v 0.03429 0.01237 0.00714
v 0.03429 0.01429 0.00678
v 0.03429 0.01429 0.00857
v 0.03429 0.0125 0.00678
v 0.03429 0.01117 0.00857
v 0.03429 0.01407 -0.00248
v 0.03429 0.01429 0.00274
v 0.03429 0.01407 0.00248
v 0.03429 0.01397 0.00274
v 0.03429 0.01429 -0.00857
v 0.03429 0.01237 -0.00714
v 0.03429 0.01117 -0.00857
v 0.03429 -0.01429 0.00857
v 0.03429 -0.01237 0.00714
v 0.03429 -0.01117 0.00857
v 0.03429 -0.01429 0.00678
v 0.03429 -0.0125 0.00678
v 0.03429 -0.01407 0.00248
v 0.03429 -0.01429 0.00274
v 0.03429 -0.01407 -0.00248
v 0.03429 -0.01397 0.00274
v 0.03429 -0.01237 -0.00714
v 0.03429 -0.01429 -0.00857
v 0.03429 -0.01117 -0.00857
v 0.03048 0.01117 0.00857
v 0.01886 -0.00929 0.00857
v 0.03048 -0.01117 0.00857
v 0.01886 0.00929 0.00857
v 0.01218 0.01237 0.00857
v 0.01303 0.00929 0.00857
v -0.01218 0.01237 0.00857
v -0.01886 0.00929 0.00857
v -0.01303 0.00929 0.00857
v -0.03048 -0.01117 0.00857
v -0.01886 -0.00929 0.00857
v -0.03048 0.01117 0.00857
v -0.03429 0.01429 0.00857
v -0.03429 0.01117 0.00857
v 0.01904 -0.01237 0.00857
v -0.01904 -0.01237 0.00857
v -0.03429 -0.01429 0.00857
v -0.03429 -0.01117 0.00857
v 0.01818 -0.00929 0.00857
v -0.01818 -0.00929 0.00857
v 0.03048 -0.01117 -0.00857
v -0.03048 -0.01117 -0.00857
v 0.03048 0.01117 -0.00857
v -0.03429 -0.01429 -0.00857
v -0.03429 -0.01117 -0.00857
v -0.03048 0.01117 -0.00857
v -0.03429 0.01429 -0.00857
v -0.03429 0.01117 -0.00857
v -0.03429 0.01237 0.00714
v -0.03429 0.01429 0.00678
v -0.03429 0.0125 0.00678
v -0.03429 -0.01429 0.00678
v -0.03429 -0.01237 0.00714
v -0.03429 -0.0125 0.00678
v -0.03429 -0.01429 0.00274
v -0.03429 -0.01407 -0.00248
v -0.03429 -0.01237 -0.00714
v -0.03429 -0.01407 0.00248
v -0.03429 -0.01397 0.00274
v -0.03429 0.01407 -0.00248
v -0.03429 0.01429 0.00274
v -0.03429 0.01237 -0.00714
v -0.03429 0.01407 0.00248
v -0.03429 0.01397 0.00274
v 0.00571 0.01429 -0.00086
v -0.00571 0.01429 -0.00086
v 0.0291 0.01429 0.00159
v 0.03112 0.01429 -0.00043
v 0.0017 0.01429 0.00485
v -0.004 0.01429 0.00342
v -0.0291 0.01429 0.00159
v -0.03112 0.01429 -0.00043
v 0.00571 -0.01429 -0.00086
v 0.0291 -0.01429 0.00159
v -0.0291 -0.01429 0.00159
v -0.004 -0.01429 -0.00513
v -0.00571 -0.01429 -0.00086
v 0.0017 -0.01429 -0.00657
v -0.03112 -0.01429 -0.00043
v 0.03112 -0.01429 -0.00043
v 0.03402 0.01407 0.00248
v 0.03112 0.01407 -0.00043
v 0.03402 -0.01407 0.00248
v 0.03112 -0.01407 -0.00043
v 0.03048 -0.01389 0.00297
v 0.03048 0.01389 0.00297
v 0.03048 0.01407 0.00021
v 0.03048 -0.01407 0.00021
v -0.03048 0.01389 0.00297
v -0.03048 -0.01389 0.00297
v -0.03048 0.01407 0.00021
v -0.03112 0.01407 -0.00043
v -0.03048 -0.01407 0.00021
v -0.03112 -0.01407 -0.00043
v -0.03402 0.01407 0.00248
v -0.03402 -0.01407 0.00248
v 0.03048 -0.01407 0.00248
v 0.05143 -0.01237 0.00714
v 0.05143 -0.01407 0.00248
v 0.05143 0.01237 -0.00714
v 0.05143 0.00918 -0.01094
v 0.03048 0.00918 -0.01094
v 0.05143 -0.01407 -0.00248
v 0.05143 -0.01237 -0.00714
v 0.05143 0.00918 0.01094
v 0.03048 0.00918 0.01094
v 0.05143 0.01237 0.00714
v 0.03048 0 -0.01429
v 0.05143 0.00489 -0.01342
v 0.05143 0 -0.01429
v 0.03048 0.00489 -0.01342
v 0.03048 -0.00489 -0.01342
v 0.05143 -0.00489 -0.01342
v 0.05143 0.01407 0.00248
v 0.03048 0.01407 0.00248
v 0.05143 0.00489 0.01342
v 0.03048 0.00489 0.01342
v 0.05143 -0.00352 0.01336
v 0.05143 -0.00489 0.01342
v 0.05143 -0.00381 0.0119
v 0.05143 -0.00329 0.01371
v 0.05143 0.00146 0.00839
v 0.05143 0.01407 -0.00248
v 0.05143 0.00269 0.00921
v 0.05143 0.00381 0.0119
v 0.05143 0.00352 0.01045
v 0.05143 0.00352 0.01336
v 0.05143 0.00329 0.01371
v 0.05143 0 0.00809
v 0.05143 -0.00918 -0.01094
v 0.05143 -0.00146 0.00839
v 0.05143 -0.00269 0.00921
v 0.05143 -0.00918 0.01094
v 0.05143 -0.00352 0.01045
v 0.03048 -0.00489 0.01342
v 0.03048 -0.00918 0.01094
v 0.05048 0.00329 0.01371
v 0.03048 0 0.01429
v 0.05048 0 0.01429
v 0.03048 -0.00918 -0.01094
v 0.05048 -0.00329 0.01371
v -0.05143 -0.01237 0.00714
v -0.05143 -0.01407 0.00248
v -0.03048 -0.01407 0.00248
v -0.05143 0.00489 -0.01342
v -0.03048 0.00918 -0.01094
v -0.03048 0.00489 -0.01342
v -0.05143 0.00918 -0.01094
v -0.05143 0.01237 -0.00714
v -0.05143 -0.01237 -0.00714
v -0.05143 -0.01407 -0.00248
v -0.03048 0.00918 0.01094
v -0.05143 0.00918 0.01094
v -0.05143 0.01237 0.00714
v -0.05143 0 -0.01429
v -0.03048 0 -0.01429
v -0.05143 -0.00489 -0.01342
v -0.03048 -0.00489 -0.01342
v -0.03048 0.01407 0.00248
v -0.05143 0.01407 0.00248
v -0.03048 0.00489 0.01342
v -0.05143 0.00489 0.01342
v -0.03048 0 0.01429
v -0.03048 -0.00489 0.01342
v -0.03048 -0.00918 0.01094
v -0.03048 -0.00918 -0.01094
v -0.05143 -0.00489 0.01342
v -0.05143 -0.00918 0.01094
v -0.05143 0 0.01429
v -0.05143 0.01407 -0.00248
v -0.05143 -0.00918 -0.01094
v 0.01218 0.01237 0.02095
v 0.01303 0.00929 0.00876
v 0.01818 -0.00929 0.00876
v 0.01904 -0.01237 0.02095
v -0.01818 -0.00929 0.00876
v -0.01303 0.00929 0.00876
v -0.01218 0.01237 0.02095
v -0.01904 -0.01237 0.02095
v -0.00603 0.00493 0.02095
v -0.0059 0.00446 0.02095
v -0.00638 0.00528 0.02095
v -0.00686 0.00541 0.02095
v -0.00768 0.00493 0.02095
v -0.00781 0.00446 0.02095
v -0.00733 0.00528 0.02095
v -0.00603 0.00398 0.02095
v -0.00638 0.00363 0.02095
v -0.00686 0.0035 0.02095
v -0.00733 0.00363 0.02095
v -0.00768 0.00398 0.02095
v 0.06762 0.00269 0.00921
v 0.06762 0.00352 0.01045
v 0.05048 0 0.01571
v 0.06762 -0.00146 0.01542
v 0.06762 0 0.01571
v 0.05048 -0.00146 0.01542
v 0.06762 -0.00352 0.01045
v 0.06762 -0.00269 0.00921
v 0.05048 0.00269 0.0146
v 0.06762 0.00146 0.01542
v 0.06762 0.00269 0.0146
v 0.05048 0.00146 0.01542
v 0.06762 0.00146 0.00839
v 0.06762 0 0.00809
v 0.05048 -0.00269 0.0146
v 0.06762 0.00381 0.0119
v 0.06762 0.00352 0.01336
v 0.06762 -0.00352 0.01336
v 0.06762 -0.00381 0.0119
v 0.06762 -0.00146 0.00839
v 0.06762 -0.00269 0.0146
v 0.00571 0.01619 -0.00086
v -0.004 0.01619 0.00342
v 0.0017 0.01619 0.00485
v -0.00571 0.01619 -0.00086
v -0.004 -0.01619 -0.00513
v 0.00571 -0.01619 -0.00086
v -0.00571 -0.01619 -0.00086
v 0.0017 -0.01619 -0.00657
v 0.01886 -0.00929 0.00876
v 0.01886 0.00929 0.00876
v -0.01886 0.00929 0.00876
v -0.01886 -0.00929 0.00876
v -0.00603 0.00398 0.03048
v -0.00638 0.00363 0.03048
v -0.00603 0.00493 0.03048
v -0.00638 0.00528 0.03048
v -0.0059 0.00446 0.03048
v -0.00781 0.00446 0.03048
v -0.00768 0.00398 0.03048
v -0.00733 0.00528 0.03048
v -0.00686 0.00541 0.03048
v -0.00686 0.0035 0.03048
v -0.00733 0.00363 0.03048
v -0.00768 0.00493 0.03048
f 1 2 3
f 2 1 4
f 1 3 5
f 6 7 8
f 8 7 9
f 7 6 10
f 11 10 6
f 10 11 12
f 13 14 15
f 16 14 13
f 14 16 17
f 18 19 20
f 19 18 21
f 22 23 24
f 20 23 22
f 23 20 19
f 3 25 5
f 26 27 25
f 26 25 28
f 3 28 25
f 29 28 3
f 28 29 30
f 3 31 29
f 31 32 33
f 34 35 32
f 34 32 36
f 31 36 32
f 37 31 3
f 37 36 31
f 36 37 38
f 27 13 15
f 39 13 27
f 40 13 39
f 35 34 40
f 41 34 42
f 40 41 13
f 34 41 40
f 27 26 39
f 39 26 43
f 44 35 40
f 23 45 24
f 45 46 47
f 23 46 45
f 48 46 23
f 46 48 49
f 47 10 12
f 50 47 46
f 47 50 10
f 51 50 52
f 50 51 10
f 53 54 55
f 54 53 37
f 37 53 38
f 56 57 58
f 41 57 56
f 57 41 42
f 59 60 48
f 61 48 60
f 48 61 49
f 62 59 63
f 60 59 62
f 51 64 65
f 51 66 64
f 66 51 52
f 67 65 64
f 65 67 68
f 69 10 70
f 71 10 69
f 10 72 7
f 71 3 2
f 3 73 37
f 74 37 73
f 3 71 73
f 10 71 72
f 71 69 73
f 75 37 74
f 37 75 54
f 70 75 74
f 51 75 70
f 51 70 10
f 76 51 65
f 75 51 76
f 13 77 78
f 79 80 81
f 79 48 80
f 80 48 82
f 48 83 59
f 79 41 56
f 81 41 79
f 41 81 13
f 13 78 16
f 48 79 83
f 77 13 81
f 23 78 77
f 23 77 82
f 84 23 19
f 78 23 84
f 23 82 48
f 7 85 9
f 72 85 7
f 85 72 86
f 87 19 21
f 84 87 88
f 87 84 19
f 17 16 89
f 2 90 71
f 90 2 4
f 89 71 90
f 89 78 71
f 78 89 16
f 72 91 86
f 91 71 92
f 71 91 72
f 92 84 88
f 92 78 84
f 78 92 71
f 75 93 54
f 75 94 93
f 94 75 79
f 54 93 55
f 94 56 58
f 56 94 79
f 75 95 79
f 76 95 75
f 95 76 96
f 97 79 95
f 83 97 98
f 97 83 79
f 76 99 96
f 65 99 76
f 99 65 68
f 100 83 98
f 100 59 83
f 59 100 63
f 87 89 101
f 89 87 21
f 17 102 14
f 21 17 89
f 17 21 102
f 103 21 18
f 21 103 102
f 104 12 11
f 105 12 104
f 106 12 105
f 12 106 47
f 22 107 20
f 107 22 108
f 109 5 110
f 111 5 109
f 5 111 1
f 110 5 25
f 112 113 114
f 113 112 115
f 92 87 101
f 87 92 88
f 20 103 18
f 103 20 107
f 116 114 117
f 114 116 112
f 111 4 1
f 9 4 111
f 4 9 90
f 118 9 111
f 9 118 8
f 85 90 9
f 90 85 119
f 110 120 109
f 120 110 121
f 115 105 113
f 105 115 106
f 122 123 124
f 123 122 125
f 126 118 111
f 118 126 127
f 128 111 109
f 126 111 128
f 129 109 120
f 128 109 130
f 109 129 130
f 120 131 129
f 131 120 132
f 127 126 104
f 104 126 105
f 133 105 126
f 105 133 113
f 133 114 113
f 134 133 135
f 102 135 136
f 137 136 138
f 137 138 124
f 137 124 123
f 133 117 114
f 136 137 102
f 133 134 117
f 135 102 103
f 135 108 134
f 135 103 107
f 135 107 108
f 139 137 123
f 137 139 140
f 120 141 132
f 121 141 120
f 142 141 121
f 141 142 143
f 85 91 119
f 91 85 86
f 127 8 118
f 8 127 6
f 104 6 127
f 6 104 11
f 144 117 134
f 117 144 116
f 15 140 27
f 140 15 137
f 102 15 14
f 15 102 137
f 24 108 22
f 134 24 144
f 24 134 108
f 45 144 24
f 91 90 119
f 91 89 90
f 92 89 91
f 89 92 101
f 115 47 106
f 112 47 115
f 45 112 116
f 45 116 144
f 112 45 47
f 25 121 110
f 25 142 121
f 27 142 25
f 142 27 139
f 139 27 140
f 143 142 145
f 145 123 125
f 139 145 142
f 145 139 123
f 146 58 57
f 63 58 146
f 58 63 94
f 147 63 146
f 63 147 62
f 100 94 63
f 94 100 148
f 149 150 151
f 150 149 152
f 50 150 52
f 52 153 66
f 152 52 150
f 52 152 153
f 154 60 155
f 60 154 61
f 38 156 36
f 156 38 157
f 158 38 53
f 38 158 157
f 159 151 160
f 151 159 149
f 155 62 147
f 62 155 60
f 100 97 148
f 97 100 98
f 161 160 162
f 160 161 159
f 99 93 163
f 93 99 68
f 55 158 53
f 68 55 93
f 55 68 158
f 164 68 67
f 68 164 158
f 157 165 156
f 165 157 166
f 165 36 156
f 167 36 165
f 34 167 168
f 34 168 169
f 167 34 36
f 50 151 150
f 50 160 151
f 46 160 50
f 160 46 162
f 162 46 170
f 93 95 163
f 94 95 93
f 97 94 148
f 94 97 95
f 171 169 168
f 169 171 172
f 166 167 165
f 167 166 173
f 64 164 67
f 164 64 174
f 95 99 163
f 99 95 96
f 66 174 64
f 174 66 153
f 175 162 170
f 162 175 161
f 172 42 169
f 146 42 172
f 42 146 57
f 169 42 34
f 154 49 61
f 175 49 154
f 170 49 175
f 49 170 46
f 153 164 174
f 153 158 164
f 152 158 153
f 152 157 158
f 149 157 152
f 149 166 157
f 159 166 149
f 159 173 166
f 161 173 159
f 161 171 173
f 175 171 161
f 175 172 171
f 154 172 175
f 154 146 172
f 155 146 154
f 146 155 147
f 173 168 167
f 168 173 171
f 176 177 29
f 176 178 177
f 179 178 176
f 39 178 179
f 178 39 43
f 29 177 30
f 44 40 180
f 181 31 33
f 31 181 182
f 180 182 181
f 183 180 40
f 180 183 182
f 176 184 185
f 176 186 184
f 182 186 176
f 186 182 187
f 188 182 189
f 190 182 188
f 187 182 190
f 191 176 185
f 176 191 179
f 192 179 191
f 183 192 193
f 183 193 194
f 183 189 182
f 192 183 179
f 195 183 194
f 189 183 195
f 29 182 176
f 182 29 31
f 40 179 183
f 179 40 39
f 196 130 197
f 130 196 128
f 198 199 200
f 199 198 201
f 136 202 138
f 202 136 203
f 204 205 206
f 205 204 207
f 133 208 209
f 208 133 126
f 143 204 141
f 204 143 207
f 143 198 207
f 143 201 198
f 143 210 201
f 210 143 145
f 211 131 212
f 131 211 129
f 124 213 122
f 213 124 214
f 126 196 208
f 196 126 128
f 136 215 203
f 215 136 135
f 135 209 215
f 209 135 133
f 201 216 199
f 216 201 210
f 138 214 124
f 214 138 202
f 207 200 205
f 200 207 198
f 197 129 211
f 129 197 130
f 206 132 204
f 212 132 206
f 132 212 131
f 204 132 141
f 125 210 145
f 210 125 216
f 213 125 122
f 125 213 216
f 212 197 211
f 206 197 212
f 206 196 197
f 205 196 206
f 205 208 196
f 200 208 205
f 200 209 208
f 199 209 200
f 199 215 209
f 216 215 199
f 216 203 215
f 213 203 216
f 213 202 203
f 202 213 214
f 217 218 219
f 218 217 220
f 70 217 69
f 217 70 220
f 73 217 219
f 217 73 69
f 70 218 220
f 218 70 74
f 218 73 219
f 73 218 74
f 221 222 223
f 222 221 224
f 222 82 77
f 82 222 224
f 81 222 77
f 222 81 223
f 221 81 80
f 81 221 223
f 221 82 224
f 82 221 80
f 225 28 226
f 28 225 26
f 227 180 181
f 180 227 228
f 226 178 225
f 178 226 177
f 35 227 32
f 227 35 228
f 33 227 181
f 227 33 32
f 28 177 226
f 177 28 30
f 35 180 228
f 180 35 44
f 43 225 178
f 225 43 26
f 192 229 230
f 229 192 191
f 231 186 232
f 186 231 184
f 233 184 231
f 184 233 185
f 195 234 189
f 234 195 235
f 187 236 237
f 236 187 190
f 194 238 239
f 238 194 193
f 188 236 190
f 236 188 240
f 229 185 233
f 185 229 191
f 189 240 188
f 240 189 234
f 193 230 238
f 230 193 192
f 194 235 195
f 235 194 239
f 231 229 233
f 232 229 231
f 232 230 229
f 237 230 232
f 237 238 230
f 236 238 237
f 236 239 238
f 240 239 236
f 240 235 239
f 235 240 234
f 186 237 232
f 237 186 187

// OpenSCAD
// Low-poly armored vehicle / tank-like model
// Fixes:
// - Ensures visible geometry (no degenerate/near-zero dimensions)
// - Adds TWO large cylindrical end pods clearly at both ends
// - Ensures ONE connected solid via calculated placements + small overlaps
// - Keeps elongated along X axis
// Note: A true 0.0mm bounding-box dimension is impossible for a solid; model has non-zero thickness.

// -------------------- Parameters (mm) --------------------
bbox_L = 0.1;
bbox_W = 0.1;
bbox_H = 0.04;          // non-zero thickness required for a solid

hull_L = 0.072;
hull_W = 0.030;
hull_H = 0.018;

pod_R = 0.015;          // large end pods
pod_L = 0.022;
pod_overlap_into_hull = 0.004;  // how much pod intrudes into hull for connectivity

turret_L = 0.040;
turret_W = 0.026;
turret_H = 0.014;

barrel_R = 0.004;
barrel_L = 0.018;

fin_L = 0.012;
fin_T = 0.003;
fin_H = 0.006;
fin_x_pos = 0.0;

overlap = 0.001;

chamfer_T = 0.003;

panel_T = 0.0012;
greeble_R = 0.0012;
greeble_H = 0.002;

antenna_R = 0.001;
antenna_H = 0.01;

// -------------------- Helpers --------------------
module clamp_bbox() {
  // Scale the whole model to fit within bbox_L x bbox_W x bbox_H
  // Compute current extents conservatively from parameters.
  // X extent includes barrel.
  cur_L = max(hull_L + 2*pod_R, hull_L + barrel_L); // conservative
  cur_W = max(hull_W, 2*pod_R, turret_W);
  cur_H = max(hull_H + turret_H + antenna_H, 2*pod_R);

  s = min(bbox_L/cur_L, bbox_W/cur_W, bbox_H/cur_H);
  scale([s, s, s]) children();
}

// -------------------- Base Shapes --------------------
module hull_main() {
  cube([hull_L, hull_W, hull_H], center=true);
}

module end_pod_raw() {
  // Cylinder axis along X
  rotate([0, 90, 0])
    cylinder(r=pod_R, h=pod_L, center=true, $fn=18);
}

module turret_roof() {
  // Faceted trapezoid roof, extruded in Z
  linear_extrude(height=turret_H, center=true, convexity=10)
    polygon(points=[
      [-turret_L/2, -turret_W/2],
      [ turret_L/2, -turret_W/2],
      [ turret_L/2 - turret_L*0.18,  turret_W/2],
      [-turret_L/2 + turret_L*0.18,  turret_W/2]
    ]);
}

module barrel_raw() {
  rotate([0, 90, 0])
    cylinder(r=barrel_R, h=barrel_L, center=true, $fn=16);
}

module fin_raw() {
  // Thin fin plate extruded in Z; will be rotated to stick out sideways
  linear_extrude(height=fin_T, center=true, convexity=10)
    polygon(points=[
      [-fin_L/2, 0],
      [ fin_L/2, 0],
      [ fin_L/2 - fin_L*0.35, fin_H],
      [-fin_L/2 + fin_L*0.15, fin_H*0.75]
    ]);
}

module chamfer_cut() {
  cube([chamfer_T, hull_W + overlap*4, hull_H/2 + overlap*2], center=true);
}

module panel_facet_top() {
  cube([hull_L*0.55, hull_W*0.65, panel_T], center=true);
}

module panel_facet_front() {
  rotate([0, 0, 90])
    cube([hull_L*0.18, hull_W*0.55, panel_T], center=true);
}

module surface_greeble() {
  cylinder(r=greeble_R, h=greeble_H, center=true, $fn=14);
}

module antenna_stub_raw() {
  cylinder(r=antenna_R, h=antenna_H, center=true, $fn=12);
}

// -------------------- Operations / Placement --------------------
module end_pod_front() {
  // Place so pod overlaps into hull by pod_overlap_into_hull
  // Pod center at: hull end + pod half - overlap_into_hull
  translate([ hull_L/2 + pod_L/2 - pod_overlap_into_hull, 0, 0 ])
    end_pod_raw();
}

module end_pod_rear() {
  translate([ -(hull_L/2 + pod_L/2 - pod_overlap_into_hull), 0, 0 ])
    end_pod_raw();
}

module turret_roof_pos() {
  translate([0, 0, hull_H/2 + turret_H/2 - overlap])
    turret_roof();
}

module barrel() {
  // Barrel protrudes from FRONT pod/hull end; ensure it intersects pod slightly
  // Front-most solid is pod front face at: (hull_L/2 + pod_L - pod_overlap_into_hull)
  front_face_x = hull_L/2 + pod_L - pod_overlap_into_hull;
  translate([ front_face_x + barrel_L/2 - overlap, 0, hull_H/2 + turret_H*0.25 ])
    barrel_raw();
}

module left_fin() {
  // Rotate so fin extrude thickness (Z) becomes lateral thickness (Y)
  translate([fin_x_pos, hull_W/2 + fin_T/2 - overlap, -hull_H*0.05])
    rotate([90, 0, 0])
      fin_raw();
}

module right_fin() {
  translate([fin_x_pos, -(hull_W/2 + fin_T/2 - overlap), -hull_H*0.05])
    rotate([-90, 0, 0])
      fin_raw();
}

module chamfer_cut_front_top_pos() {
  translate([ hull_L/2 - chamfer_T/2 + overlap, 0, hull_H/2 - hull_H/4 ])
    rotate([0, 45, 0])
      chamfer_cut();
}

module chamfer_cut_rear_top_pos() {
  translate([ -(hull_L/2 - chamfer_T/2 + overlap), 0, hull_H/2 - hull_H/4 ])
    rotate([0, -45, 0])
      chamfer_cut();
}

module hull_chamfers() {
  difference() {
    hull_main();
    chamfer_cut_front_top_pos();
    chamfer_cut_rear_top_pos();
  }
}

module panel_facet_top_pos() {
  translate([0, 0, hull_H/2 + panel_T/2 - overlap])
    panel_facet_top();
}

module panel_facet_front_pos() {
  translate([hull_L*0.22, 0, hull_H*0.05])
    panel_facet_front();
}

module surface_greeble_1_pos() {
  translate([-hull_L*0.12, hull_W*0.18, hull_H/2 + greeble_H/2 - overlap])
    surface_greeble();
}

module surface_greeble_2_pos() {
  translate([hull_L*0.08, -hull_W*0.22, hull_H/2 + greeble_H/2 - overlap])
    surface_greeble();
}

module antenna_stub() {
  translate([-turret_L*0.18, turret_W*0.18, hull_H/2 + turret_H - overlap + antenna_H/2])
    antenna_stub_raw();
}

// -------------------- Final Vehicle Model --------------------
module vehicle_union_main() {
  union() {
    hull_chamfers();

    // Two large cylindrical end pods (clearly present)
    end_pod_front();
    end_pod_rear();

    // Faceted turret/roof
    turret_roof_pos();

    // Barrel protruding from one end
    barrel();

    // Lateral fins/winglets
    left_fin();
    right_fin();

    // Surface facets / greebles (kept connected via overlap)
    panel_facet_top_pos();
    panel_facet_front_pos();
    surface_greeble_1_pos();
    surface_greeble_2_pos();

    // Antenna
    antenna_stub();
  }
}

// Render (scaled to requested bbox limits as closely as possible)
clamp_bbox() vehicle_union_main();
